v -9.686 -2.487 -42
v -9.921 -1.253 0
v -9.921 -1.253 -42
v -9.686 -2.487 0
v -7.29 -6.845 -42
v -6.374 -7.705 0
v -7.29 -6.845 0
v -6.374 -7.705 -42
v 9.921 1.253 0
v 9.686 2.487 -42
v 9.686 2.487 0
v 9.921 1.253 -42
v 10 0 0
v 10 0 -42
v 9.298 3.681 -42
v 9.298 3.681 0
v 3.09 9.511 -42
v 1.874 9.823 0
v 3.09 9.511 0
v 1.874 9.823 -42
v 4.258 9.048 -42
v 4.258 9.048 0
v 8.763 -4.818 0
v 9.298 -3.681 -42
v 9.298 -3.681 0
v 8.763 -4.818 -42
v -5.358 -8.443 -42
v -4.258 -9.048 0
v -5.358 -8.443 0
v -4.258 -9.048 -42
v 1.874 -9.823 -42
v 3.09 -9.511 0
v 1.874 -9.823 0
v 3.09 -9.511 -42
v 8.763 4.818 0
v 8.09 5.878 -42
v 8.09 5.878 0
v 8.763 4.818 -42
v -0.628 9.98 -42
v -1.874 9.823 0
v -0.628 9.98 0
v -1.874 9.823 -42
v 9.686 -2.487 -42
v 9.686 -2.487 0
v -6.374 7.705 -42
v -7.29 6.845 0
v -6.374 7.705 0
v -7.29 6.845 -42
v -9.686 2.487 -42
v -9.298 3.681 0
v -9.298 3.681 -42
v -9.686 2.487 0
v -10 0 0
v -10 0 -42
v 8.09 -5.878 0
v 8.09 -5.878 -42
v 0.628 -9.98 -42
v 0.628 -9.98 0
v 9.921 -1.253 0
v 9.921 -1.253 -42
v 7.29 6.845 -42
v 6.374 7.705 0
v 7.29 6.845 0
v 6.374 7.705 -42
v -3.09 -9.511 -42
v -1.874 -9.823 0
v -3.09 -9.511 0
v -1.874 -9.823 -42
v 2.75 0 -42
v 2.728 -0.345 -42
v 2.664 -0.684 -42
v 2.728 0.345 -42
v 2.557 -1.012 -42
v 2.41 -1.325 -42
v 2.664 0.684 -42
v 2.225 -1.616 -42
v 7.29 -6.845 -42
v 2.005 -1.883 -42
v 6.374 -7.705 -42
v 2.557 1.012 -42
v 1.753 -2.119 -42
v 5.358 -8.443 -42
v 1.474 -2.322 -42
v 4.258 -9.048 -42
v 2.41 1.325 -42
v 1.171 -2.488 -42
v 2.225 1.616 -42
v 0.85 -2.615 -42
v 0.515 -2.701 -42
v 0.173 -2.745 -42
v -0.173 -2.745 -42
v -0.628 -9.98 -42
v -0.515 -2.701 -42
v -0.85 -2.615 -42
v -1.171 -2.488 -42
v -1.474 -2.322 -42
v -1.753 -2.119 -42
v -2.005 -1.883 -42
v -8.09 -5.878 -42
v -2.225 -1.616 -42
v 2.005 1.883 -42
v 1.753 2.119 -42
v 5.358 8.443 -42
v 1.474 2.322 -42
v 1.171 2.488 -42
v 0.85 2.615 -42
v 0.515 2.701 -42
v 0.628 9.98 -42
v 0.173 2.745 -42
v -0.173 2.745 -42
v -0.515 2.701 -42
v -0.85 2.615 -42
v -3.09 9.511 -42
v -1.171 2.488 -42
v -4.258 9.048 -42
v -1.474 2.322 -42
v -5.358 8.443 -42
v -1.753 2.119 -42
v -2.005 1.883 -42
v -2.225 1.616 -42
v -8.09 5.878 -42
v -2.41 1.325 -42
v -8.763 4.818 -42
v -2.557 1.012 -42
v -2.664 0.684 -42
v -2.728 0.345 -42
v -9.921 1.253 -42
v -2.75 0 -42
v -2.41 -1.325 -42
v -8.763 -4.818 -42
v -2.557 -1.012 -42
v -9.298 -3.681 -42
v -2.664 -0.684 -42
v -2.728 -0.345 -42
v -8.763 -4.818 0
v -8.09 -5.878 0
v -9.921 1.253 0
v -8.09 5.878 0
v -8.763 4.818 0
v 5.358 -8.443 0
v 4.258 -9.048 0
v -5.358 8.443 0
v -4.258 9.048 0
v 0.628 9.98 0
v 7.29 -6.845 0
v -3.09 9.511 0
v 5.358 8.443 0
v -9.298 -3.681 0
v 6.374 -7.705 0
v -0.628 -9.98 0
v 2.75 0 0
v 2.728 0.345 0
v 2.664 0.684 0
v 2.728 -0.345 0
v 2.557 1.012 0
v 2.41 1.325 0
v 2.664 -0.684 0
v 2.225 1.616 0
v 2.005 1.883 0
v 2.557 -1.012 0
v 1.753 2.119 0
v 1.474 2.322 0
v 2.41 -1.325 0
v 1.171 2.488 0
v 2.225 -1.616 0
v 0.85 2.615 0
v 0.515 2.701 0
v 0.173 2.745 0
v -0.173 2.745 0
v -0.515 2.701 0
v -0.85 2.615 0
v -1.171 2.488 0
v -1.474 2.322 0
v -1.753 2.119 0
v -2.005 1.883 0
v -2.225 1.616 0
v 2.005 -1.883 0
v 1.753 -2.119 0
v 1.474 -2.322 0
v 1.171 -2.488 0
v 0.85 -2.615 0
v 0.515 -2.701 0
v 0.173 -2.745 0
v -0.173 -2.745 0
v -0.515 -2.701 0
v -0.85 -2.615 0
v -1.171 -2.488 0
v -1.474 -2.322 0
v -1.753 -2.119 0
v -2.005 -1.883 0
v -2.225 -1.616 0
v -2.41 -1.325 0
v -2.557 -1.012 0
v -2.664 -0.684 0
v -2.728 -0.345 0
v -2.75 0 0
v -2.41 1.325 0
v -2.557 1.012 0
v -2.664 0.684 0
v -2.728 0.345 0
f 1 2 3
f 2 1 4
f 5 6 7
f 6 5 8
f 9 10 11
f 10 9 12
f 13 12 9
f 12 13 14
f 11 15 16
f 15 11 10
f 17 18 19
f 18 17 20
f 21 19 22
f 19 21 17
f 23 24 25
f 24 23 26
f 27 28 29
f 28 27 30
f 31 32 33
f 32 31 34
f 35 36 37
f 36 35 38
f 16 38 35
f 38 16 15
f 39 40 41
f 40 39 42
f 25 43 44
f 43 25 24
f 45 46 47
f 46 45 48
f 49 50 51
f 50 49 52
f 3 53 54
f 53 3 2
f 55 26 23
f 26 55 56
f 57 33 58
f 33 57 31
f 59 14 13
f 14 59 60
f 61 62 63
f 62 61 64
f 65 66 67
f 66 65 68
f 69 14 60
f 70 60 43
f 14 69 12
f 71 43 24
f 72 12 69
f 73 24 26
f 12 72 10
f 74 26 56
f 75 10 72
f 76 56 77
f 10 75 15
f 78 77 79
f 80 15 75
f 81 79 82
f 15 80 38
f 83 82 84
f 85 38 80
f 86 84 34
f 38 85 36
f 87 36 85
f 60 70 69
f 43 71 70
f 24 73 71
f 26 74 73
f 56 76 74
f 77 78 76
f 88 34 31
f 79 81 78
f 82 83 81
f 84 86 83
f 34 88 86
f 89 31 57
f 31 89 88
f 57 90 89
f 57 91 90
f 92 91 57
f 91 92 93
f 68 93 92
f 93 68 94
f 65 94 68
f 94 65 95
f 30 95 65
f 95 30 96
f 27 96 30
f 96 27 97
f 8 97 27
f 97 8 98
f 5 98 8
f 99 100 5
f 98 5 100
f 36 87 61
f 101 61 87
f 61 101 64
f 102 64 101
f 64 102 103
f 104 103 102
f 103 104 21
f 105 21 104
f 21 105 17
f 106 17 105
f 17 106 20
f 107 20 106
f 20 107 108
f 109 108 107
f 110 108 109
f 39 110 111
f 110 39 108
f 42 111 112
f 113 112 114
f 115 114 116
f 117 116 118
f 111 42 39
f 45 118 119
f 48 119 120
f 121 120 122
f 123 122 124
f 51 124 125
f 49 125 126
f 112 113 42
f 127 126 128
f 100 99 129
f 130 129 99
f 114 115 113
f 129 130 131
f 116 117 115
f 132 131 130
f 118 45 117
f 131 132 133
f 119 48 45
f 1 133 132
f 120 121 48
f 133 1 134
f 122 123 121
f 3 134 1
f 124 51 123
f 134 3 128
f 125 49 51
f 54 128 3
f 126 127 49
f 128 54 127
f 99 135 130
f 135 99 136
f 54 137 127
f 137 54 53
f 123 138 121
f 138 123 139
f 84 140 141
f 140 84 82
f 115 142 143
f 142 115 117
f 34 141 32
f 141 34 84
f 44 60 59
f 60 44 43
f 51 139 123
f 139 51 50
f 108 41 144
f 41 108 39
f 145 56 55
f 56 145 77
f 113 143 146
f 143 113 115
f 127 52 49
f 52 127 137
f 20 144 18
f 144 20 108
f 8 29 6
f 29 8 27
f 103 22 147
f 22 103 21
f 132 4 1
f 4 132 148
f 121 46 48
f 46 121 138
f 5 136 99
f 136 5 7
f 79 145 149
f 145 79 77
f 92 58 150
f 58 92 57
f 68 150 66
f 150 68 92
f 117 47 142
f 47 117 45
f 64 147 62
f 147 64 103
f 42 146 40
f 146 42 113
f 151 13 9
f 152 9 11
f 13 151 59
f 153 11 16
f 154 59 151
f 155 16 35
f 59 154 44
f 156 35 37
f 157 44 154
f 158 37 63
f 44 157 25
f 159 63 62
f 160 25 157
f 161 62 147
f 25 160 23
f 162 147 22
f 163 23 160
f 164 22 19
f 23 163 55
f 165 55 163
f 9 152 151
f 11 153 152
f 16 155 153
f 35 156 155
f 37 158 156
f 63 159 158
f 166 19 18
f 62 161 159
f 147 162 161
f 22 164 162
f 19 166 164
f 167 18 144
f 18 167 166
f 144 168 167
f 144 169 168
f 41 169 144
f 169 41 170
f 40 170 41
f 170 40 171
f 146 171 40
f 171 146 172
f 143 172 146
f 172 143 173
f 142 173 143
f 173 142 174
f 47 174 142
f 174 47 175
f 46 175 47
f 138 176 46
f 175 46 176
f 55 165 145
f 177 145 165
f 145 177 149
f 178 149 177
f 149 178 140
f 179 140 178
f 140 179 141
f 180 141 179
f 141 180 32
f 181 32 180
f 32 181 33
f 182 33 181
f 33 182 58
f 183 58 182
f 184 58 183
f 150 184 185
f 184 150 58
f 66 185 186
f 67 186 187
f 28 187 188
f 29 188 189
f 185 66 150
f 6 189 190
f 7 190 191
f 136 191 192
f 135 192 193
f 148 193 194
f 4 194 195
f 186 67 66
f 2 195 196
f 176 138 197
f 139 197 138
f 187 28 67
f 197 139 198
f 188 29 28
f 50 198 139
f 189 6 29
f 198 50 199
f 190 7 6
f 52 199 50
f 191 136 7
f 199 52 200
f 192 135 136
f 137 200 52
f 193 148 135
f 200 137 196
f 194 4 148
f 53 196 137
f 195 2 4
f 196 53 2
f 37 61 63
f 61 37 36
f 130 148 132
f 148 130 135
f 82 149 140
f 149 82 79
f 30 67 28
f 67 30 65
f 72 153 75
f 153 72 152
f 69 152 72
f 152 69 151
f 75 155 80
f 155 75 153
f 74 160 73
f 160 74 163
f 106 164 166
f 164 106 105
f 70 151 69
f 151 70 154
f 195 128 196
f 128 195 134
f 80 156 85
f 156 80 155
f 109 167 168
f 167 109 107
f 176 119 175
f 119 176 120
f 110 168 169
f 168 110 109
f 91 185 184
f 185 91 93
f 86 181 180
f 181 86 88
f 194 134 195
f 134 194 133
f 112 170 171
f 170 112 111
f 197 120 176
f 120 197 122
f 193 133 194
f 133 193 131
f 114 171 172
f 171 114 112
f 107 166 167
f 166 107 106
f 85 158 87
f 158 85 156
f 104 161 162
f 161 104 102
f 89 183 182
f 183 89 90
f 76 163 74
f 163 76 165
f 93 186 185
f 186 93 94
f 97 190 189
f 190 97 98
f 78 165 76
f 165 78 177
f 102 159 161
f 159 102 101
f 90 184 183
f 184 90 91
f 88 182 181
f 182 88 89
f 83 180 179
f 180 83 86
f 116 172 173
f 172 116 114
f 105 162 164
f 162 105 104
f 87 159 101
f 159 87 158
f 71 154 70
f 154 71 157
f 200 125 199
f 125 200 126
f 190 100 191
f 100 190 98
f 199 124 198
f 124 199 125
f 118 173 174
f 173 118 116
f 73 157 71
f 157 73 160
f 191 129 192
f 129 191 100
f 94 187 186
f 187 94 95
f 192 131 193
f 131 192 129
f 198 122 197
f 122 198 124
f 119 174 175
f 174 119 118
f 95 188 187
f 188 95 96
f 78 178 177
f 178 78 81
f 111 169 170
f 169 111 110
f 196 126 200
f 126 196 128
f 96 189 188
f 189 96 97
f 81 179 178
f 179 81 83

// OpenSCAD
$fn = 50;


difference() {
	union() {
		translate(v = [0, 0, -42.0000000000]) {
			cylinder(h = 42, r = 10.0000000000);
		}
	}
	union() {
		#translate(v = [0, 0, -42]) {
			cylinder(h = 42, r = 2.7500000000);
		}
	}
}
